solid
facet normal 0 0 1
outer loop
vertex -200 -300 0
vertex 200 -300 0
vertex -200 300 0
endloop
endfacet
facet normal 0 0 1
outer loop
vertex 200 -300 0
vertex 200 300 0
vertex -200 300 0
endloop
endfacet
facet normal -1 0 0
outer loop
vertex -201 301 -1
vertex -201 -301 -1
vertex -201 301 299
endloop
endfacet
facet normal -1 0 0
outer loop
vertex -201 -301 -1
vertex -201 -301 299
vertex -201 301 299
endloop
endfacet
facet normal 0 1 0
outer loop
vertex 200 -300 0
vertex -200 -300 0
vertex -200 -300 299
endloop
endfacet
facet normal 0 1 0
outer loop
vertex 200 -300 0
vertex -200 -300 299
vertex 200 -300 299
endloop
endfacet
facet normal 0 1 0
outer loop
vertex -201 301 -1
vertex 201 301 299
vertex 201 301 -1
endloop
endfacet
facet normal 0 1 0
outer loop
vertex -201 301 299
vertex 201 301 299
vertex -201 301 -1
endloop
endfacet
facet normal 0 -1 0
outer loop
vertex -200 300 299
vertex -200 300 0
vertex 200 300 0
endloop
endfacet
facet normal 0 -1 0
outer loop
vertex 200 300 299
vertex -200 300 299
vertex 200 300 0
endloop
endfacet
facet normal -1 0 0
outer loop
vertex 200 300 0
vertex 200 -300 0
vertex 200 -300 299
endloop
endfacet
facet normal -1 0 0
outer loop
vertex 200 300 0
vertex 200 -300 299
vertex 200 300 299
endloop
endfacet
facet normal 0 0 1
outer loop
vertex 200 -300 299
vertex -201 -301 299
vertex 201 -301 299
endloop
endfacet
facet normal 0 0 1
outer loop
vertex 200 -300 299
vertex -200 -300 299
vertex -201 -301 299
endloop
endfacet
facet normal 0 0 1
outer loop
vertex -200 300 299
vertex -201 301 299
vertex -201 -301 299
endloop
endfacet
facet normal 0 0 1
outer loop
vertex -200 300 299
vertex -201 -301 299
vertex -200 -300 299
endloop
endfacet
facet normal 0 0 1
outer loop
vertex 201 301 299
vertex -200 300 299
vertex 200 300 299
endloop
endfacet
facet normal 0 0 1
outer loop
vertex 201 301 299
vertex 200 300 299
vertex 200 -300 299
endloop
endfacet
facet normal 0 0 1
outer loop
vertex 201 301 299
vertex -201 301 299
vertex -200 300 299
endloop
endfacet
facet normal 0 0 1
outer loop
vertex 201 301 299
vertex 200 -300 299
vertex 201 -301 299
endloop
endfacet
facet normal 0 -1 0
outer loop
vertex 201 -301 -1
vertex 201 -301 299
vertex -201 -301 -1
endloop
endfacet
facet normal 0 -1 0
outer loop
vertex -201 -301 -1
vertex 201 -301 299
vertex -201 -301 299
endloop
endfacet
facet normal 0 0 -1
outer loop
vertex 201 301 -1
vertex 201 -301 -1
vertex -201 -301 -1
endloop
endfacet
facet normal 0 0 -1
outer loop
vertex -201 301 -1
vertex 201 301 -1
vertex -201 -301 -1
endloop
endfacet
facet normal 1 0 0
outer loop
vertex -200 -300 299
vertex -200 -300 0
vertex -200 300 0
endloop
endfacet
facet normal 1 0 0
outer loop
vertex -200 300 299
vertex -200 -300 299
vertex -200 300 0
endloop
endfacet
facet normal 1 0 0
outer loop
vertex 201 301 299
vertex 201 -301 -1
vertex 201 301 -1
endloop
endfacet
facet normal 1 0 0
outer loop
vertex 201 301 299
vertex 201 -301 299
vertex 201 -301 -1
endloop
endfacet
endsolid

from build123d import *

# Parameters (mm, degrees)
SKETCH1_W           = 402
SKETCH1_H           = 602
SKETCH1_W_2         = 400
SKETCH1_H_2         = 600
BOSS_EXTRUDE1_DEPTH = 299
SKETCH2_W           = 402
SKETCH2_H           = 602
BOSS_EXTRUDE2_DEPTH = 1


with BuildPart() as part:
    # Sketch1 → Boss-Extrude1 (new body)
    with BuildSketch(Plane.XY):
        Rectangle(SKETCH1_W, SKETCH1_H)
        Rectangle(SKETCH1_W_2, SKETCH1_H_2, mode=Mode.SUBTRACT)
    extrude(amount=BOSS_EXTRUDE1_DEPTH)

    # Sketch2 → Boss-Extrude2 (add)
    with BuildSketch(Plane(origin=(0, 0, 0), x_dir=(-1, 0, 0), z_dir=(0, 0, -1))):
        Rectangle(SKETCH2_W, SKETCH2_H)
    extrude(amount=BOSS_EXTRUDE2_DEPTH)


solid = part.part
